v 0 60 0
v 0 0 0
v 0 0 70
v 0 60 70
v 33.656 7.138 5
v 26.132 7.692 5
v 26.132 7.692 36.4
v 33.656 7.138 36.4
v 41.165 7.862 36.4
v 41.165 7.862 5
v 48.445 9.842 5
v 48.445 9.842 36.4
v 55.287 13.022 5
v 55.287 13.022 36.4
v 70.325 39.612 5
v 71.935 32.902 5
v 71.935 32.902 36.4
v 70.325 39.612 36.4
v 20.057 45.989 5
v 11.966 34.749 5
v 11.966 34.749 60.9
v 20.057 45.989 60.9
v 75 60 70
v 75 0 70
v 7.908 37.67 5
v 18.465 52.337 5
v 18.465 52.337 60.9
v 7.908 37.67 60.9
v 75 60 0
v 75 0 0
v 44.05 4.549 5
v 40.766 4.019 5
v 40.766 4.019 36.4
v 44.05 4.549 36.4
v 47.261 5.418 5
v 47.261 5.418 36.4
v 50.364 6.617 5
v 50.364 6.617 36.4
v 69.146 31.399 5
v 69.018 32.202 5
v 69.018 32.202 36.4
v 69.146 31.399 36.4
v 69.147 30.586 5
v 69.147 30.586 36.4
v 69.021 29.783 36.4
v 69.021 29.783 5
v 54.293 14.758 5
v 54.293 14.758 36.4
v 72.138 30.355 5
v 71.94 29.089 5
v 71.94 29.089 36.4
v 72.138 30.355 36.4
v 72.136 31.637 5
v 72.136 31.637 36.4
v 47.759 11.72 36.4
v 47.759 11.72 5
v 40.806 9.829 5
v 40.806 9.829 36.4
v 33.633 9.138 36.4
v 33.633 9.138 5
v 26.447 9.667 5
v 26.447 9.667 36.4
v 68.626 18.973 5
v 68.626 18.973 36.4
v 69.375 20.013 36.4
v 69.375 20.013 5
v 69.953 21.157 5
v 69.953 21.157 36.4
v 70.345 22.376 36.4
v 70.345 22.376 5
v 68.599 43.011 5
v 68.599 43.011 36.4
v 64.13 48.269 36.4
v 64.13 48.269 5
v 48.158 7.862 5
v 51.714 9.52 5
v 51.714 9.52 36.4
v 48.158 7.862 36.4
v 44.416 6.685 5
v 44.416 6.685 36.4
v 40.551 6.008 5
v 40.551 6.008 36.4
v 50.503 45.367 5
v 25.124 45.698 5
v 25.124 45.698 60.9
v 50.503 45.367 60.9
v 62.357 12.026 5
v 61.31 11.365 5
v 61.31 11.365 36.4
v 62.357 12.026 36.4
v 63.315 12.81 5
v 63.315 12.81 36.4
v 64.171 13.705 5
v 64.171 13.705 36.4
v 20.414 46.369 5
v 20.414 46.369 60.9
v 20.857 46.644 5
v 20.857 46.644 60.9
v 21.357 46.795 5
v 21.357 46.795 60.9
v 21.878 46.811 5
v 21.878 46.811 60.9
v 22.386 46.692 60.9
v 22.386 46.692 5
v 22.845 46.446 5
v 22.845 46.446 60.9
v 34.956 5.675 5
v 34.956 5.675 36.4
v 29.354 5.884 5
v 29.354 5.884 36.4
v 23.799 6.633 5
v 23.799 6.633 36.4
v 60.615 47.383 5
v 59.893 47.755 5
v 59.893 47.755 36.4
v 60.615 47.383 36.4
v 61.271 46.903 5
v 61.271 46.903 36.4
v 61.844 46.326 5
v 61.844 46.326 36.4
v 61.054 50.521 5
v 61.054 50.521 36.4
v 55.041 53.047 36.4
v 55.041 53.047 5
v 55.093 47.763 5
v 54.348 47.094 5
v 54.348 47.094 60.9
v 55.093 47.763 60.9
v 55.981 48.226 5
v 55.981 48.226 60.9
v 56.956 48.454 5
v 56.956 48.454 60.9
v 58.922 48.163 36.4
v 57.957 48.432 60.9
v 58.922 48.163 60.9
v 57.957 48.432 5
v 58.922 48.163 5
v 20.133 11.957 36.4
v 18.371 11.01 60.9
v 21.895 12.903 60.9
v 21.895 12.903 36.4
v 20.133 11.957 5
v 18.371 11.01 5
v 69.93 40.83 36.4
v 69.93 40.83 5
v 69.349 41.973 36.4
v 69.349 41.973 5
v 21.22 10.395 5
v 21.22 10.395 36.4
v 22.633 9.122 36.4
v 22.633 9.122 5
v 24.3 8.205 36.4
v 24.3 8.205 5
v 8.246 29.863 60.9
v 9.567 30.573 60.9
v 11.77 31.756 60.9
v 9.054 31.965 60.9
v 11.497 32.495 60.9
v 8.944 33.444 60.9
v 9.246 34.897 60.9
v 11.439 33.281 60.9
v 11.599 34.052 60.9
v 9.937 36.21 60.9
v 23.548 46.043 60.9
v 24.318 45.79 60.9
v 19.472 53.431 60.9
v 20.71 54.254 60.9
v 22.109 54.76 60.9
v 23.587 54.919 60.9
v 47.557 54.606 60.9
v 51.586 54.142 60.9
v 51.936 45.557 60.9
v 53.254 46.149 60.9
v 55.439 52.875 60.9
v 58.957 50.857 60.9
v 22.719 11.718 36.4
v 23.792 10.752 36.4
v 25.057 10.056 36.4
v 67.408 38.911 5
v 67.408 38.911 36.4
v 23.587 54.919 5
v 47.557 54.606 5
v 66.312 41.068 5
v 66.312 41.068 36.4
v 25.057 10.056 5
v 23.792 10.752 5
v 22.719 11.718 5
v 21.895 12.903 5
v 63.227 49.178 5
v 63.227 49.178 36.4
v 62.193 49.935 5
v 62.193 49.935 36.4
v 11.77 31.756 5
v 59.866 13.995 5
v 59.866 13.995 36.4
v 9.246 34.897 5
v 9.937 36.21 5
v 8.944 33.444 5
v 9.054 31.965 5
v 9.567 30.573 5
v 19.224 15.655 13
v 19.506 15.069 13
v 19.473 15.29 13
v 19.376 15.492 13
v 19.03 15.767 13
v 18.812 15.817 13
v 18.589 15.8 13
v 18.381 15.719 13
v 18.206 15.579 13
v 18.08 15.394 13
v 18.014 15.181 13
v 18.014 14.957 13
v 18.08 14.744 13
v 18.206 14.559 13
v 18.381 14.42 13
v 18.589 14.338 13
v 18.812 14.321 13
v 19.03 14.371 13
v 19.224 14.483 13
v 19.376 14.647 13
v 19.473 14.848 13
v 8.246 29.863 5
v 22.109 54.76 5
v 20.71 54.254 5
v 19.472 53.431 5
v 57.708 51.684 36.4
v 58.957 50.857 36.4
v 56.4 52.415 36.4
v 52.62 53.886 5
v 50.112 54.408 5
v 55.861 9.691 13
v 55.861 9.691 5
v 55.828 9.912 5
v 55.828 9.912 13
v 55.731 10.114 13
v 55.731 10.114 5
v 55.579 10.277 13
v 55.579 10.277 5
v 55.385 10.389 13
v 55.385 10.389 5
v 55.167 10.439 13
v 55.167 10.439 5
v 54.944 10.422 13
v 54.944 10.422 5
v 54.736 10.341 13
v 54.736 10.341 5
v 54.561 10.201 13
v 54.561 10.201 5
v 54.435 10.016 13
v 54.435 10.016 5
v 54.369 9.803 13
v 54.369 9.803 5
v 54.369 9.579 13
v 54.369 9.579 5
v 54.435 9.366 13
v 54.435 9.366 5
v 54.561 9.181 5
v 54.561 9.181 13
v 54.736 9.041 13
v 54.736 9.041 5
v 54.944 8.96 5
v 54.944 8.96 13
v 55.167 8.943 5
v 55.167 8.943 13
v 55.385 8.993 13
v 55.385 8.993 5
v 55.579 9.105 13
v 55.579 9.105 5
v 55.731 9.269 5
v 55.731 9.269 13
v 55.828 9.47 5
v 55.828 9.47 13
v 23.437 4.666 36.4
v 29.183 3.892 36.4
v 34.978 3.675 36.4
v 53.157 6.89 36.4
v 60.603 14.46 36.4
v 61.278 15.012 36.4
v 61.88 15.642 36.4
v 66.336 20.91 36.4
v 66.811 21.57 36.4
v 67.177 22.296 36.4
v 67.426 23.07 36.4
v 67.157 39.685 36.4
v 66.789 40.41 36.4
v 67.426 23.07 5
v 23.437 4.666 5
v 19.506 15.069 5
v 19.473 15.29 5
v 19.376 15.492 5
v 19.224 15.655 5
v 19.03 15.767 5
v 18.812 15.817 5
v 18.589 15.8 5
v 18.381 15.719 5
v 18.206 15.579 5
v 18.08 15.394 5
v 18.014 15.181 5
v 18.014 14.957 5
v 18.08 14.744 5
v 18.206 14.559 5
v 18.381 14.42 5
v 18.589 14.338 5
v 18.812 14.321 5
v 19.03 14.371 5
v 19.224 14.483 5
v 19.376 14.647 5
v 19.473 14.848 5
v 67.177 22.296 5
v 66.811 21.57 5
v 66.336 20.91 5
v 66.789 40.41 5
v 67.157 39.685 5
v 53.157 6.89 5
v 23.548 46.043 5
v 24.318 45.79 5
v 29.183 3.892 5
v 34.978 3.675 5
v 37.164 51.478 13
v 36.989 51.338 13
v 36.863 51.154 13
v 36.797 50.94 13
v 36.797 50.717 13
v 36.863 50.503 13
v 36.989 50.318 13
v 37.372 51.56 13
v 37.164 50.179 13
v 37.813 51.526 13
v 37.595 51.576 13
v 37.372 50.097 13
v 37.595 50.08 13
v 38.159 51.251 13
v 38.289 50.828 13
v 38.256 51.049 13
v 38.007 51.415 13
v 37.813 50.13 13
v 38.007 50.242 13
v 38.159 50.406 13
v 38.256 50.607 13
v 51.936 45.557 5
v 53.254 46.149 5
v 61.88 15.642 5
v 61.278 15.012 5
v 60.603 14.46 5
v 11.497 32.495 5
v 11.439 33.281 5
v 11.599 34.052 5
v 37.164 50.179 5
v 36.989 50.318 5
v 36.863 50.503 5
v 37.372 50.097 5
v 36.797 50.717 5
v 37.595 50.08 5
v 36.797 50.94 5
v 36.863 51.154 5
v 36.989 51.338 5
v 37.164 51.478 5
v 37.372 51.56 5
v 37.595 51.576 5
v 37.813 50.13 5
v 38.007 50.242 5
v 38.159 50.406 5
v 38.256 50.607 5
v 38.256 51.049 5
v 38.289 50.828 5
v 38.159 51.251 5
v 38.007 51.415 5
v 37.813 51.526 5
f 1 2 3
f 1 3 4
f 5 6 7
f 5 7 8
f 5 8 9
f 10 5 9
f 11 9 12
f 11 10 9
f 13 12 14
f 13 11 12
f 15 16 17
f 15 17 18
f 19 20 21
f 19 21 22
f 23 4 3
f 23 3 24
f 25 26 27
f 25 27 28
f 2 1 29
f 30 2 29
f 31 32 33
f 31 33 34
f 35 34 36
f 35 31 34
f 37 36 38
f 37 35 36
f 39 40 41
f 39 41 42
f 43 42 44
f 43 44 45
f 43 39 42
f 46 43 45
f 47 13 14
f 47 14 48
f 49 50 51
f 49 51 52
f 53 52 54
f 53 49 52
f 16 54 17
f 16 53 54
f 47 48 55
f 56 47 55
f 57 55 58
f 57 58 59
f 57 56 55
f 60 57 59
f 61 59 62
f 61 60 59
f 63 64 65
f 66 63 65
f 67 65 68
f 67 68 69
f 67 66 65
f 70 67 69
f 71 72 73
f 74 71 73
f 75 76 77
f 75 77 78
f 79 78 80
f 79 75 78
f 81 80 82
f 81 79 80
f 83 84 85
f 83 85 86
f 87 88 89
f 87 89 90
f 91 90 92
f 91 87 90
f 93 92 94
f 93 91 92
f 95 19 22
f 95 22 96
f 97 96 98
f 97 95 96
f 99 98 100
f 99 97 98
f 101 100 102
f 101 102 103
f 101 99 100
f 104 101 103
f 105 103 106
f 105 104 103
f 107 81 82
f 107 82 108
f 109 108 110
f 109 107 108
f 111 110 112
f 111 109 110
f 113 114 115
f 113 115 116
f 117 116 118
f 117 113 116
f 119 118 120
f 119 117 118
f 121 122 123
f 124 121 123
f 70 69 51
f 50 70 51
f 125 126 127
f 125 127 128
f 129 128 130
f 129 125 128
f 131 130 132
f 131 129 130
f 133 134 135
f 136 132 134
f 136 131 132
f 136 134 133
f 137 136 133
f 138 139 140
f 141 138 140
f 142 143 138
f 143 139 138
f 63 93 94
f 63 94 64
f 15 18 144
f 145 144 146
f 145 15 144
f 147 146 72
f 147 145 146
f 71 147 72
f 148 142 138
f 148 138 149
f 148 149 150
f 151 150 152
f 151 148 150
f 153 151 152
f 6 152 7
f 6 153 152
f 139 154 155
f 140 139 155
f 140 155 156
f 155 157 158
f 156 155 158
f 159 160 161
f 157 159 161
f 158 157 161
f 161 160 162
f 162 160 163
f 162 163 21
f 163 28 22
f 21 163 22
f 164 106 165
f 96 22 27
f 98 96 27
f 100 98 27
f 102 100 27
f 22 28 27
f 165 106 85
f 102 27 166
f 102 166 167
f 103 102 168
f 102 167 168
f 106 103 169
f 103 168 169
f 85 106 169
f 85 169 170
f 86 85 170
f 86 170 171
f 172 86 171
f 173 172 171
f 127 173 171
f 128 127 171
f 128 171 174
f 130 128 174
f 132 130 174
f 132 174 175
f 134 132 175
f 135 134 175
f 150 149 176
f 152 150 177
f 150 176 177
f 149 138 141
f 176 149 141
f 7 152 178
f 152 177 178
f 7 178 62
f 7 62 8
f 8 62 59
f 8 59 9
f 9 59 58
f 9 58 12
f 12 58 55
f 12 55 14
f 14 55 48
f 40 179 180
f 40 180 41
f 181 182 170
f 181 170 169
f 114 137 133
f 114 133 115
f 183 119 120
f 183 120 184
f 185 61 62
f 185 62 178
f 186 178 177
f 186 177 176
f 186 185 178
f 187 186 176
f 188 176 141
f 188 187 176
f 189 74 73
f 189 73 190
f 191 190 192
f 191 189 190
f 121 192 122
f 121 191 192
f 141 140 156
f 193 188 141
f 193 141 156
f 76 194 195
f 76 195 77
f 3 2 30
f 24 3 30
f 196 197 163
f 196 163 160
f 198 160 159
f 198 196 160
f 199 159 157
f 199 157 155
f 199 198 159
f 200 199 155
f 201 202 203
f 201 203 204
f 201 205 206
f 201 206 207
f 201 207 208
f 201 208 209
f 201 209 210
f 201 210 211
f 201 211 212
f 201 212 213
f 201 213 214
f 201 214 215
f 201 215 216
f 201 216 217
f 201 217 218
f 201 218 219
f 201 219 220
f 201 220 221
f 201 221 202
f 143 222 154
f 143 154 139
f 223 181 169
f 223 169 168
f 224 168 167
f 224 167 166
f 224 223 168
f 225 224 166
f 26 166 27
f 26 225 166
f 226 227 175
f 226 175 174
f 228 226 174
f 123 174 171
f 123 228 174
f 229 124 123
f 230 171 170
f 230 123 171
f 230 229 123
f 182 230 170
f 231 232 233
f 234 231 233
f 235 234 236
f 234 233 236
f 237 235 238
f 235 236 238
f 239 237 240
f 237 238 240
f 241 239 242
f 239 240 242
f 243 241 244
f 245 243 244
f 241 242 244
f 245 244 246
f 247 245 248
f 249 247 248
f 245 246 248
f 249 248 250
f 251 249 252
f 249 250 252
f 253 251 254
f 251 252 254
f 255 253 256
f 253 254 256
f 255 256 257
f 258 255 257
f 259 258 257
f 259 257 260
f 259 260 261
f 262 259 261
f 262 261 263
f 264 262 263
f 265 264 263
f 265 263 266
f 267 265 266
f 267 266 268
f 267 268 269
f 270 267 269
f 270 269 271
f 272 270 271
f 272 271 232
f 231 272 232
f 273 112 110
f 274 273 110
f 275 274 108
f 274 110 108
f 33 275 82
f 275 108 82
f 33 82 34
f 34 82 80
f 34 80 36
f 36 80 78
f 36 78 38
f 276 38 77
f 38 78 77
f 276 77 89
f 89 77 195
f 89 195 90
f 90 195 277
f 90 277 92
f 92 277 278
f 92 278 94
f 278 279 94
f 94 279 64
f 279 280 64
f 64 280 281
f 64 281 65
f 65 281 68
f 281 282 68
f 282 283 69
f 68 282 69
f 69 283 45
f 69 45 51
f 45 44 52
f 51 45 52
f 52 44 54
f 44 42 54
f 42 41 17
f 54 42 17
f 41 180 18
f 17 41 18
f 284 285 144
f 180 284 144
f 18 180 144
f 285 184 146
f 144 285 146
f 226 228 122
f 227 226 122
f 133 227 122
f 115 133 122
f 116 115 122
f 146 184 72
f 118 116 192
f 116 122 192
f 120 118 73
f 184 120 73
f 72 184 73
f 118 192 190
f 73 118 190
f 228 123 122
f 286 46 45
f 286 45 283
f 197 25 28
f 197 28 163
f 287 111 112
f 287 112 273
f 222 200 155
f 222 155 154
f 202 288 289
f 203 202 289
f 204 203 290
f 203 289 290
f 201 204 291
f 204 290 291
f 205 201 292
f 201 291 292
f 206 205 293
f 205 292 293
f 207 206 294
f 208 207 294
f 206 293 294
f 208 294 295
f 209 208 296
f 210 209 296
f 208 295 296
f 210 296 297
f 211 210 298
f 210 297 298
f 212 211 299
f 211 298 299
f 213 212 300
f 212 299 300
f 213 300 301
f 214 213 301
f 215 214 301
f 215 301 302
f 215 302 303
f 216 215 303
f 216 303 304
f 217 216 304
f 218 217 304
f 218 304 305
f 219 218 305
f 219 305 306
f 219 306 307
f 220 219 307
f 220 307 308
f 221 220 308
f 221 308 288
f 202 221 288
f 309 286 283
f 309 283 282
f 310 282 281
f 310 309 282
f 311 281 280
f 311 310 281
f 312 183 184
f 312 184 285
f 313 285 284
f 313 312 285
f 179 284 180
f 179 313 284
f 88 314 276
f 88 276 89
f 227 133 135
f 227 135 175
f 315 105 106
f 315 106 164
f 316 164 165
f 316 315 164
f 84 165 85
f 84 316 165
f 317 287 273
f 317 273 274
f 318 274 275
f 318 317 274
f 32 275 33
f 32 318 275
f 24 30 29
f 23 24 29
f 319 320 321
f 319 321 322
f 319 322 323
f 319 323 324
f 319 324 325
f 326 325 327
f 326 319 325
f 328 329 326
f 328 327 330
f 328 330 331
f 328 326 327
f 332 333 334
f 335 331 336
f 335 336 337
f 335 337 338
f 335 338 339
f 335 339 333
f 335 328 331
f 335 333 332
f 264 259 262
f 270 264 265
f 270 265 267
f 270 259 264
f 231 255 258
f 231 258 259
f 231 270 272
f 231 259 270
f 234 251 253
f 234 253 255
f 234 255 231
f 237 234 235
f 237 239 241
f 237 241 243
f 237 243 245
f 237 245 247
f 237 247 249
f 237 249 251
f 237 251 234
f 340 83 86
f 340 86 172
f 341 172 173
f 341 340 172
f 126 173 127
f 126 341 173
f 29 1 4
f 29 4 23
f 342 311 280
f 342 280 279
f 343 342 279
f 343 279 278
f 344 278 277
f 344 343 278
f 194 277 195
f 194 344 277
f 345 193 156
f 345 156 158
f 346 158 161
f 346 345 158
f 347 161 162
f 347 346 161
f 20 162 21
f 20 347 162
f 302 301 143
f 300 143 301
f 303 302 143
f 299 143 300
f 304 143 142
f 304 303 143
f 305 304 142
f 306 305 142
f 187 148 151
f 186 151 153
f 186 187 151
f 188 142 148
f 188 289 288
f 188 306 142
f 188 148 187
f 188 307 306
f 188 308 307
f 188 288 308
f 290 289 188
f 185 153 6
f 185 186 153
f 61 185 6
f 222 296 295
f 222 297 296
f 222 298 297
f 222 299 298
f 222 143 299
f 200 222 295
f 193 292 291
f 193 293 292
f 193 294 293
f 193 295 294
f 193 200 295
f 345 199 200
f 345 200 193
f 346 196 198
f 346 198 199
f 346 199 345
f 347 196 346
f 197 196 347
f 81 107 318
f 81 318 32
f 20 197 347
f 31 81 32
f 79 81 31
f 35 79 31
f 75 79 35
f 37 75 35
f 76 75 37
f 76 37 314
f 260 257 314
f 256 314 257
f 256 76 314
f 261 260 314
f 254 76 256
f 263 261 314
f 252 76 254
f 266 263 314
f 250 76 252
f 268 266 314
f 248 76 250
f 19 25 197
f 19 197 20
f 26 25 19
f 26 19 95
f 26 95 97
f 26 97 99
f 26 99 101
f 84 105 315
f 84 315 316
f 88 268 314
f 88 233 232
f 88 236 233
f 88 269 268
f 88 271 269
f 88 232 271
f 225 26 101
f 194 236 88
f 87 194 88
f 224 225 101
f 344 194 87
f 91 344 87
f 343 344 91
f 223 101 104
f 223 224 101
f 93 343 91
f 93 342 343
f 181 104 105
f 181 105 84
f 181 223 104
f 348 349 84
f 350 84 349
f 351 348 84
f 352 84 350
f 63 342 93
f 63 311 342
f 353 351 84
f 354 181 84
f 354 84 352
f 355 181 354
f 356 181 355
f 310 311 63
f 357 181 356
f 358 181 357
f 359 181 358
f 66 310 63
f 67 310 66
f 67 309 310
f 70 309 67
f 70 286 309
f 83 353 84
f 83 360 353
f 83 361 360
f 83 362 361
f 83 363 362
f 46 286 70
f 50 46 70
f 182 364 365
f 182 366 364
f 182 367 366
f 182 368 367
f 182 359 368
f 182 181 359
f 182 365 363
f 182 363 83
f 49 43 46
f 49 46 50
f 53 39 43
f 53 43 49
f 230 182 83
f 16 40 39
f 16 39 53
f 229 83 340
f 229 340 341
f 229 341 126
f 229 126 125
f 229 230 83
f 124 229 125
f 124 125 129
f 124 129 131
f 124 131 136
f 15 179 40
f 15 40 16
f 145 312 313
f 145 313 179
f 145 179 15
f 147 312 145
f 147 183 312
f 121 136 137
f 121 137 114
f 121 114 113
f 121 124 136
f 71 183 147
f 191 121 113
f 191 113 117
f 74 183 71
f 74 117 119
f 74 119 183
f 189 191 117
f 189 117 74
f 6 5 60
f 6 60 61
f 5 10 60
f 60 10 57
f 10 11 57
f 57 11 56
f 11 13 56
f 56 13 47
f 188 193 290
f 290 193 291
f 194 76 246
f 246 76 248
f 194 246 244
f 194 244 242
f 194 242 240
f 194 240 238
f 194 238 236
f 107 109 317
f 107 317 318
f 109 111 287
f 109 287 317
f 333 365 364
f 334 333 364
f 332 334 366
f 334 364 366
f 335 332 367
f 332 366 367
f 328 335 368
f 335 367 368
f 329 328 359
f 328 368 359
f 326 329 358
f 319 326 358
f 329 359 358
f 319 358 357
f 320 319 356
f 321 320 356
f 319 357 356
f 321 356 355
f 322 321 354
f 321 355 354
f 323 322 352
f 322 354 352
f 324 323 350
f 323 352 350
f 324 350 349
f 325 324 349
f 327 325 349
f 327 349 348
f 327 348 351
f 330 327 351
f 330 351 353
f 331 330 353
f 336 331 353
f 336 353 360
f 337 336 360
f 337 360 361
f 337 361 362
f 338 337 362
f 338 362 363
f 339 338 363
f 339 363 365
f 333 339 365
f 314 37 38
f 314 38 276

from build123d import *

# Parameters (mm, degrees)
SKETCH1_W           = 75
SKETCH1_H           = 60
BOSS_EXTRUDE1_DEPTH = 70
CAVITY1_START       = 5
CAVITY1_OUTLINE_R   = 0.75
CAVITY1_DEPTH       = 55.9
CAVITY1_2_OUTLINE_R = 0.75
CAVITY1_2_DEPTH     = 31.4
CAVITY1_START_2     = 13
CAVITY1_3_OUTLINE_R = 0.75
CAVITY1_3_DEPTH     = 47.9
CAVITY1_4_OUTLINE_R = 0.75
CAVITY1_4_DEPTH     = 23.4


# Read off the part's stored shape, not the designer's step: Cavity1
with BuildPart() as part:
    # Sketch1 → Boss-Extrude1 (new body)
    with BuildSketch(Plane.XY):
        with Locations((37.5, 30)):
            Rectangle(SKETCH1_W, SKETCH1_H)
    extrude(amount=BOSS_EXTRUDE1_DEPTH)

    # Cavity1 outline → Cavity1 (cut)
    with BuildSketch(Plane.XY.offset(CAVITY1_START)):
        with BuildLine():
            Line((18.46548662, 52.336946082), (7.908006381, 37.670492946))
            Line((7.908006381, 37.670492946), (9.936997433, 36.209946709))
            ThreePointArc((9.936997433, 36.209946709), (8.94403376, 33.444468797), (9.567109894, 30.572949848))
            Line((9.567109894, 30.572949848), (8.245641386, 29.863216812))
            Line((8.245641386, 29.863216812), (18.37116603, 11.010266096))
            Line((18.37116603, 11.010266096), (21.895082052, 12.902887525))
            Line((21.895082052, 12.902887525), (11.769557408, 31.755838241))
            ThreePointArc((11.769557408, 31.755838241), (11.438668953, 33.280776232), (11.965988485, 34.749400472))
            Line((11.965988485, 34.749400472), (20.056953769, 45.989370661))
            ThreePointArc((20.056953769, 45.989370661), (21.356620935, 46.794592998), (22.845349854, 46.446449406))
            ThreePointArc((22.845349854, 46.446449406), (23.927028985, 45.897391402), (25.123551575, 45.697821555))
            Line((25.123551575, 45.697821555), (50.502868756, 45.366563013))
            ThreePointArc((50.502868756, 45.366563013), (52.616494227, 45.804976964), (54.348334803, 47.093521742))
            ThreePointArc((54.348334803, 47.093521742), (56.461375235, 48.37027811), (58.92150101, 48.163329184))
            Line((58.92150101, 48.163329184), (58.956655303, 50.856669359))
            ThreePointArc((58.956655303, 50.856669359), (53.544792902, 53.606340424), (47.557302608, 54.60579307))
            Line((47.557302608, 54.60579307), (23.587024567, 54.918660406))
            ThreePointArc((23.587024567, 54.918660406), (20.710384856, 54.254419425), (18.46548662, 52.336946082))
        make_face()
        with Locations((18.756110409, 15.069070512)):
            Circle(CAVITY1_OUTLINE_R, mode=Mode.SUBTRACT)
        with Locations((37.538899797, 50.828307501)):
            Circle(CAVITY1_OUTLINE_R, mode=Mode.SUBTRACT)
    extrude(amount=CAVITY1_DEPTH, mode=Mode.SUBTRACT)

    # Cavity1 2 outline → Cavity1 2 (cut)
    # profile 1 of 2: a face of its own
    with BuildSketch(Plane.XY.offset(CAVITY1_START)):
        with BuildLine():
            Line((61.054335289, 50.521376908), (55.041269461, 53.046995369))
            ThreePointArc((55.041269461, 53.046995369), (57.060573485, 52.061967221), (58.956655303, 50.856669359))
            Line((58.956655303, 50.856669359), (58.92150101, 48.163329184))
            Line((58.92150101, 48.163329184), (59.892586686, 47.755452074))
            ThreePointArc((59.892586686, 47.755452074), (60.952620575, 47.155751273), (61.844382404, 46.326249172))
            Line((61.844382404, 46.326249172), (66.312422732, 41.068244262))
            ThreePointArc((66.312422732, 41.068244262), (66.987141001, 40.054307304), (67.407914577, 38.911388893))
            Line((67.407914577, 38.911388893), (69.018283104, 32.201939348))
            ThreePointArc((69.018283104, 32.201939348), (69.162099385, 30.992547032), (69.021092891, 29.782823896))
            Line((69.021092891, 29.782823896), (67.426314651, 23.069651593))
            ThreePointArc((67.426314651, 23.069651593), (67.008197192, 21.925758816), (66.335836102, 20.910257235))
            Line((66.335836102, 20.910257235), (61.88002209, 15.641887326))
            ThreePointArc((61.88002209, 15.641887326), (60.948767594, 14.725996436), (59.86612003, 13.995267134))
            Line((59.86612003, 13.995267134), (51.713665819, 9.520058721))
            ThreePointArc((51.713665819, 9.520058721), (46.306249088, 7.211864539), (40.551434527, 6.007694509))
            ThreePointArc((40.551434527, 6.007694509), (32.152585039, 5.712059517), (23.799153538, 6.633067087))
            Line((23.799153538, 6.633067087), (23.436550639, 4.666211949))
            ThreePointArc((23.436550639, 4.666211949), (32.077975822, 3.713451636), (40.766384828, 4.019278967))
            ThreePointArc((40.766384828, 4.019278967), (45.667164707, 4.941518532), (50.36406223, 6.617025293))
            Line((50.36406223, 6.617025293), (53.157281436, 6.890234782))
            Line((53.157281436, 6.890234782), (61.309735647, 11.365443195))
            ThreePointArc((61.309735647, 11.365443195), (62.847708644, 12.403492855), (64.170617702, 13.704576886))
            Line((64.170617702, 13.704576886), (68.626431714, 18.972946795))
            ThreePointArc((68.626431714, 18.972946795), (69.686109361, 20.573432518), (70.345085218, 22.37626975))
            Line((70.345085218, 22.37626975), (71.939863457, 29.089442053))
            ThreePointArc((71.939863457, 29.089442053), (72.162097362, 30.99603151), (71.93543508, 32.902099577))
            Line((71.93543508, 32.902099577), (70.325066554, 39.611549122))
            ThreePointArc((70.325066554, 39.611549122), (69.661904513, 41.4128507), (68.598511823, 43.010870491))
            Line((68.598511823, 43.010870491), (64.130471496, 48.268875401))
            ThreePointArc((64.130471496, 48.268875401), (62.725006351, 49.576215828), (61.054335289, 50.521376908))
        make_face()
        with Locations((55.111079675, 9.691018641)):
            Circle(CAVITY1_2_OUTLINE_R, mode=Mode.SUBTRACT)
    # profile 2 of 2: a face of its own
    with BuildSketch(Plane.XY.offset(CAVITY1_START)):
        with BuildLine():
            Line((21.895082052, 12.902887525), (20.133124041, 11.956576811))
            ThreePointArc((20.133124041, 11.956576811), (22.633217451, 9.122098941), (26.13158906, 7.691669655))
            ThreePointArc((26.13158906, 7.691669655), (41.165451618, 7.861619441), (55.287009069, 13.021805628))
            Line((55.287009069, 13.021805628), (54.29349955, 14.757587538))
            ThreePointArc((54.29349955, 14.757587538), (40.805776793, 9.829012137), (26.446697007, 9.66669041))
            ThreePointArc((26.446697007, 9.66669041), (23.79214447, 10.752095311), (21.895082052, 12.902887525))
        make_face()
    extrude(amount=CAVITY1_2_DEPTH, mode=Mode.SUBTRACT)

    # Cavity1 3 outline → Cavity1 3 (cut)
    with BuildSketch(Plane.XY.offset(CAVITY1_START_2)):
        with Locations((18.756110409, 15.069070512)):
            Circle(CAVITY1_3_OUTLINE_R)
        with Locations((37.538899797, 50.828307501)):
            Circle(CAVITY1_3_OUTLINE_R)
    extrude(amount=CAVITY1_3_DEPTH, mode=Mode.SUBTRACT)

    # Cavity1 4 outline → Cavity1 4 (cut)
    with BuildSketch(Plane.XY.offset(CAVITY1_START_2)):
        with Locations((55.111079675, 9.691018641)):
            Circle(CAVITY1_4_OUTLINE_R)
    extrude(amount=CAVITY1_4_DEPTH, mode=Mode.SUBTRACT)


solid = part.part
